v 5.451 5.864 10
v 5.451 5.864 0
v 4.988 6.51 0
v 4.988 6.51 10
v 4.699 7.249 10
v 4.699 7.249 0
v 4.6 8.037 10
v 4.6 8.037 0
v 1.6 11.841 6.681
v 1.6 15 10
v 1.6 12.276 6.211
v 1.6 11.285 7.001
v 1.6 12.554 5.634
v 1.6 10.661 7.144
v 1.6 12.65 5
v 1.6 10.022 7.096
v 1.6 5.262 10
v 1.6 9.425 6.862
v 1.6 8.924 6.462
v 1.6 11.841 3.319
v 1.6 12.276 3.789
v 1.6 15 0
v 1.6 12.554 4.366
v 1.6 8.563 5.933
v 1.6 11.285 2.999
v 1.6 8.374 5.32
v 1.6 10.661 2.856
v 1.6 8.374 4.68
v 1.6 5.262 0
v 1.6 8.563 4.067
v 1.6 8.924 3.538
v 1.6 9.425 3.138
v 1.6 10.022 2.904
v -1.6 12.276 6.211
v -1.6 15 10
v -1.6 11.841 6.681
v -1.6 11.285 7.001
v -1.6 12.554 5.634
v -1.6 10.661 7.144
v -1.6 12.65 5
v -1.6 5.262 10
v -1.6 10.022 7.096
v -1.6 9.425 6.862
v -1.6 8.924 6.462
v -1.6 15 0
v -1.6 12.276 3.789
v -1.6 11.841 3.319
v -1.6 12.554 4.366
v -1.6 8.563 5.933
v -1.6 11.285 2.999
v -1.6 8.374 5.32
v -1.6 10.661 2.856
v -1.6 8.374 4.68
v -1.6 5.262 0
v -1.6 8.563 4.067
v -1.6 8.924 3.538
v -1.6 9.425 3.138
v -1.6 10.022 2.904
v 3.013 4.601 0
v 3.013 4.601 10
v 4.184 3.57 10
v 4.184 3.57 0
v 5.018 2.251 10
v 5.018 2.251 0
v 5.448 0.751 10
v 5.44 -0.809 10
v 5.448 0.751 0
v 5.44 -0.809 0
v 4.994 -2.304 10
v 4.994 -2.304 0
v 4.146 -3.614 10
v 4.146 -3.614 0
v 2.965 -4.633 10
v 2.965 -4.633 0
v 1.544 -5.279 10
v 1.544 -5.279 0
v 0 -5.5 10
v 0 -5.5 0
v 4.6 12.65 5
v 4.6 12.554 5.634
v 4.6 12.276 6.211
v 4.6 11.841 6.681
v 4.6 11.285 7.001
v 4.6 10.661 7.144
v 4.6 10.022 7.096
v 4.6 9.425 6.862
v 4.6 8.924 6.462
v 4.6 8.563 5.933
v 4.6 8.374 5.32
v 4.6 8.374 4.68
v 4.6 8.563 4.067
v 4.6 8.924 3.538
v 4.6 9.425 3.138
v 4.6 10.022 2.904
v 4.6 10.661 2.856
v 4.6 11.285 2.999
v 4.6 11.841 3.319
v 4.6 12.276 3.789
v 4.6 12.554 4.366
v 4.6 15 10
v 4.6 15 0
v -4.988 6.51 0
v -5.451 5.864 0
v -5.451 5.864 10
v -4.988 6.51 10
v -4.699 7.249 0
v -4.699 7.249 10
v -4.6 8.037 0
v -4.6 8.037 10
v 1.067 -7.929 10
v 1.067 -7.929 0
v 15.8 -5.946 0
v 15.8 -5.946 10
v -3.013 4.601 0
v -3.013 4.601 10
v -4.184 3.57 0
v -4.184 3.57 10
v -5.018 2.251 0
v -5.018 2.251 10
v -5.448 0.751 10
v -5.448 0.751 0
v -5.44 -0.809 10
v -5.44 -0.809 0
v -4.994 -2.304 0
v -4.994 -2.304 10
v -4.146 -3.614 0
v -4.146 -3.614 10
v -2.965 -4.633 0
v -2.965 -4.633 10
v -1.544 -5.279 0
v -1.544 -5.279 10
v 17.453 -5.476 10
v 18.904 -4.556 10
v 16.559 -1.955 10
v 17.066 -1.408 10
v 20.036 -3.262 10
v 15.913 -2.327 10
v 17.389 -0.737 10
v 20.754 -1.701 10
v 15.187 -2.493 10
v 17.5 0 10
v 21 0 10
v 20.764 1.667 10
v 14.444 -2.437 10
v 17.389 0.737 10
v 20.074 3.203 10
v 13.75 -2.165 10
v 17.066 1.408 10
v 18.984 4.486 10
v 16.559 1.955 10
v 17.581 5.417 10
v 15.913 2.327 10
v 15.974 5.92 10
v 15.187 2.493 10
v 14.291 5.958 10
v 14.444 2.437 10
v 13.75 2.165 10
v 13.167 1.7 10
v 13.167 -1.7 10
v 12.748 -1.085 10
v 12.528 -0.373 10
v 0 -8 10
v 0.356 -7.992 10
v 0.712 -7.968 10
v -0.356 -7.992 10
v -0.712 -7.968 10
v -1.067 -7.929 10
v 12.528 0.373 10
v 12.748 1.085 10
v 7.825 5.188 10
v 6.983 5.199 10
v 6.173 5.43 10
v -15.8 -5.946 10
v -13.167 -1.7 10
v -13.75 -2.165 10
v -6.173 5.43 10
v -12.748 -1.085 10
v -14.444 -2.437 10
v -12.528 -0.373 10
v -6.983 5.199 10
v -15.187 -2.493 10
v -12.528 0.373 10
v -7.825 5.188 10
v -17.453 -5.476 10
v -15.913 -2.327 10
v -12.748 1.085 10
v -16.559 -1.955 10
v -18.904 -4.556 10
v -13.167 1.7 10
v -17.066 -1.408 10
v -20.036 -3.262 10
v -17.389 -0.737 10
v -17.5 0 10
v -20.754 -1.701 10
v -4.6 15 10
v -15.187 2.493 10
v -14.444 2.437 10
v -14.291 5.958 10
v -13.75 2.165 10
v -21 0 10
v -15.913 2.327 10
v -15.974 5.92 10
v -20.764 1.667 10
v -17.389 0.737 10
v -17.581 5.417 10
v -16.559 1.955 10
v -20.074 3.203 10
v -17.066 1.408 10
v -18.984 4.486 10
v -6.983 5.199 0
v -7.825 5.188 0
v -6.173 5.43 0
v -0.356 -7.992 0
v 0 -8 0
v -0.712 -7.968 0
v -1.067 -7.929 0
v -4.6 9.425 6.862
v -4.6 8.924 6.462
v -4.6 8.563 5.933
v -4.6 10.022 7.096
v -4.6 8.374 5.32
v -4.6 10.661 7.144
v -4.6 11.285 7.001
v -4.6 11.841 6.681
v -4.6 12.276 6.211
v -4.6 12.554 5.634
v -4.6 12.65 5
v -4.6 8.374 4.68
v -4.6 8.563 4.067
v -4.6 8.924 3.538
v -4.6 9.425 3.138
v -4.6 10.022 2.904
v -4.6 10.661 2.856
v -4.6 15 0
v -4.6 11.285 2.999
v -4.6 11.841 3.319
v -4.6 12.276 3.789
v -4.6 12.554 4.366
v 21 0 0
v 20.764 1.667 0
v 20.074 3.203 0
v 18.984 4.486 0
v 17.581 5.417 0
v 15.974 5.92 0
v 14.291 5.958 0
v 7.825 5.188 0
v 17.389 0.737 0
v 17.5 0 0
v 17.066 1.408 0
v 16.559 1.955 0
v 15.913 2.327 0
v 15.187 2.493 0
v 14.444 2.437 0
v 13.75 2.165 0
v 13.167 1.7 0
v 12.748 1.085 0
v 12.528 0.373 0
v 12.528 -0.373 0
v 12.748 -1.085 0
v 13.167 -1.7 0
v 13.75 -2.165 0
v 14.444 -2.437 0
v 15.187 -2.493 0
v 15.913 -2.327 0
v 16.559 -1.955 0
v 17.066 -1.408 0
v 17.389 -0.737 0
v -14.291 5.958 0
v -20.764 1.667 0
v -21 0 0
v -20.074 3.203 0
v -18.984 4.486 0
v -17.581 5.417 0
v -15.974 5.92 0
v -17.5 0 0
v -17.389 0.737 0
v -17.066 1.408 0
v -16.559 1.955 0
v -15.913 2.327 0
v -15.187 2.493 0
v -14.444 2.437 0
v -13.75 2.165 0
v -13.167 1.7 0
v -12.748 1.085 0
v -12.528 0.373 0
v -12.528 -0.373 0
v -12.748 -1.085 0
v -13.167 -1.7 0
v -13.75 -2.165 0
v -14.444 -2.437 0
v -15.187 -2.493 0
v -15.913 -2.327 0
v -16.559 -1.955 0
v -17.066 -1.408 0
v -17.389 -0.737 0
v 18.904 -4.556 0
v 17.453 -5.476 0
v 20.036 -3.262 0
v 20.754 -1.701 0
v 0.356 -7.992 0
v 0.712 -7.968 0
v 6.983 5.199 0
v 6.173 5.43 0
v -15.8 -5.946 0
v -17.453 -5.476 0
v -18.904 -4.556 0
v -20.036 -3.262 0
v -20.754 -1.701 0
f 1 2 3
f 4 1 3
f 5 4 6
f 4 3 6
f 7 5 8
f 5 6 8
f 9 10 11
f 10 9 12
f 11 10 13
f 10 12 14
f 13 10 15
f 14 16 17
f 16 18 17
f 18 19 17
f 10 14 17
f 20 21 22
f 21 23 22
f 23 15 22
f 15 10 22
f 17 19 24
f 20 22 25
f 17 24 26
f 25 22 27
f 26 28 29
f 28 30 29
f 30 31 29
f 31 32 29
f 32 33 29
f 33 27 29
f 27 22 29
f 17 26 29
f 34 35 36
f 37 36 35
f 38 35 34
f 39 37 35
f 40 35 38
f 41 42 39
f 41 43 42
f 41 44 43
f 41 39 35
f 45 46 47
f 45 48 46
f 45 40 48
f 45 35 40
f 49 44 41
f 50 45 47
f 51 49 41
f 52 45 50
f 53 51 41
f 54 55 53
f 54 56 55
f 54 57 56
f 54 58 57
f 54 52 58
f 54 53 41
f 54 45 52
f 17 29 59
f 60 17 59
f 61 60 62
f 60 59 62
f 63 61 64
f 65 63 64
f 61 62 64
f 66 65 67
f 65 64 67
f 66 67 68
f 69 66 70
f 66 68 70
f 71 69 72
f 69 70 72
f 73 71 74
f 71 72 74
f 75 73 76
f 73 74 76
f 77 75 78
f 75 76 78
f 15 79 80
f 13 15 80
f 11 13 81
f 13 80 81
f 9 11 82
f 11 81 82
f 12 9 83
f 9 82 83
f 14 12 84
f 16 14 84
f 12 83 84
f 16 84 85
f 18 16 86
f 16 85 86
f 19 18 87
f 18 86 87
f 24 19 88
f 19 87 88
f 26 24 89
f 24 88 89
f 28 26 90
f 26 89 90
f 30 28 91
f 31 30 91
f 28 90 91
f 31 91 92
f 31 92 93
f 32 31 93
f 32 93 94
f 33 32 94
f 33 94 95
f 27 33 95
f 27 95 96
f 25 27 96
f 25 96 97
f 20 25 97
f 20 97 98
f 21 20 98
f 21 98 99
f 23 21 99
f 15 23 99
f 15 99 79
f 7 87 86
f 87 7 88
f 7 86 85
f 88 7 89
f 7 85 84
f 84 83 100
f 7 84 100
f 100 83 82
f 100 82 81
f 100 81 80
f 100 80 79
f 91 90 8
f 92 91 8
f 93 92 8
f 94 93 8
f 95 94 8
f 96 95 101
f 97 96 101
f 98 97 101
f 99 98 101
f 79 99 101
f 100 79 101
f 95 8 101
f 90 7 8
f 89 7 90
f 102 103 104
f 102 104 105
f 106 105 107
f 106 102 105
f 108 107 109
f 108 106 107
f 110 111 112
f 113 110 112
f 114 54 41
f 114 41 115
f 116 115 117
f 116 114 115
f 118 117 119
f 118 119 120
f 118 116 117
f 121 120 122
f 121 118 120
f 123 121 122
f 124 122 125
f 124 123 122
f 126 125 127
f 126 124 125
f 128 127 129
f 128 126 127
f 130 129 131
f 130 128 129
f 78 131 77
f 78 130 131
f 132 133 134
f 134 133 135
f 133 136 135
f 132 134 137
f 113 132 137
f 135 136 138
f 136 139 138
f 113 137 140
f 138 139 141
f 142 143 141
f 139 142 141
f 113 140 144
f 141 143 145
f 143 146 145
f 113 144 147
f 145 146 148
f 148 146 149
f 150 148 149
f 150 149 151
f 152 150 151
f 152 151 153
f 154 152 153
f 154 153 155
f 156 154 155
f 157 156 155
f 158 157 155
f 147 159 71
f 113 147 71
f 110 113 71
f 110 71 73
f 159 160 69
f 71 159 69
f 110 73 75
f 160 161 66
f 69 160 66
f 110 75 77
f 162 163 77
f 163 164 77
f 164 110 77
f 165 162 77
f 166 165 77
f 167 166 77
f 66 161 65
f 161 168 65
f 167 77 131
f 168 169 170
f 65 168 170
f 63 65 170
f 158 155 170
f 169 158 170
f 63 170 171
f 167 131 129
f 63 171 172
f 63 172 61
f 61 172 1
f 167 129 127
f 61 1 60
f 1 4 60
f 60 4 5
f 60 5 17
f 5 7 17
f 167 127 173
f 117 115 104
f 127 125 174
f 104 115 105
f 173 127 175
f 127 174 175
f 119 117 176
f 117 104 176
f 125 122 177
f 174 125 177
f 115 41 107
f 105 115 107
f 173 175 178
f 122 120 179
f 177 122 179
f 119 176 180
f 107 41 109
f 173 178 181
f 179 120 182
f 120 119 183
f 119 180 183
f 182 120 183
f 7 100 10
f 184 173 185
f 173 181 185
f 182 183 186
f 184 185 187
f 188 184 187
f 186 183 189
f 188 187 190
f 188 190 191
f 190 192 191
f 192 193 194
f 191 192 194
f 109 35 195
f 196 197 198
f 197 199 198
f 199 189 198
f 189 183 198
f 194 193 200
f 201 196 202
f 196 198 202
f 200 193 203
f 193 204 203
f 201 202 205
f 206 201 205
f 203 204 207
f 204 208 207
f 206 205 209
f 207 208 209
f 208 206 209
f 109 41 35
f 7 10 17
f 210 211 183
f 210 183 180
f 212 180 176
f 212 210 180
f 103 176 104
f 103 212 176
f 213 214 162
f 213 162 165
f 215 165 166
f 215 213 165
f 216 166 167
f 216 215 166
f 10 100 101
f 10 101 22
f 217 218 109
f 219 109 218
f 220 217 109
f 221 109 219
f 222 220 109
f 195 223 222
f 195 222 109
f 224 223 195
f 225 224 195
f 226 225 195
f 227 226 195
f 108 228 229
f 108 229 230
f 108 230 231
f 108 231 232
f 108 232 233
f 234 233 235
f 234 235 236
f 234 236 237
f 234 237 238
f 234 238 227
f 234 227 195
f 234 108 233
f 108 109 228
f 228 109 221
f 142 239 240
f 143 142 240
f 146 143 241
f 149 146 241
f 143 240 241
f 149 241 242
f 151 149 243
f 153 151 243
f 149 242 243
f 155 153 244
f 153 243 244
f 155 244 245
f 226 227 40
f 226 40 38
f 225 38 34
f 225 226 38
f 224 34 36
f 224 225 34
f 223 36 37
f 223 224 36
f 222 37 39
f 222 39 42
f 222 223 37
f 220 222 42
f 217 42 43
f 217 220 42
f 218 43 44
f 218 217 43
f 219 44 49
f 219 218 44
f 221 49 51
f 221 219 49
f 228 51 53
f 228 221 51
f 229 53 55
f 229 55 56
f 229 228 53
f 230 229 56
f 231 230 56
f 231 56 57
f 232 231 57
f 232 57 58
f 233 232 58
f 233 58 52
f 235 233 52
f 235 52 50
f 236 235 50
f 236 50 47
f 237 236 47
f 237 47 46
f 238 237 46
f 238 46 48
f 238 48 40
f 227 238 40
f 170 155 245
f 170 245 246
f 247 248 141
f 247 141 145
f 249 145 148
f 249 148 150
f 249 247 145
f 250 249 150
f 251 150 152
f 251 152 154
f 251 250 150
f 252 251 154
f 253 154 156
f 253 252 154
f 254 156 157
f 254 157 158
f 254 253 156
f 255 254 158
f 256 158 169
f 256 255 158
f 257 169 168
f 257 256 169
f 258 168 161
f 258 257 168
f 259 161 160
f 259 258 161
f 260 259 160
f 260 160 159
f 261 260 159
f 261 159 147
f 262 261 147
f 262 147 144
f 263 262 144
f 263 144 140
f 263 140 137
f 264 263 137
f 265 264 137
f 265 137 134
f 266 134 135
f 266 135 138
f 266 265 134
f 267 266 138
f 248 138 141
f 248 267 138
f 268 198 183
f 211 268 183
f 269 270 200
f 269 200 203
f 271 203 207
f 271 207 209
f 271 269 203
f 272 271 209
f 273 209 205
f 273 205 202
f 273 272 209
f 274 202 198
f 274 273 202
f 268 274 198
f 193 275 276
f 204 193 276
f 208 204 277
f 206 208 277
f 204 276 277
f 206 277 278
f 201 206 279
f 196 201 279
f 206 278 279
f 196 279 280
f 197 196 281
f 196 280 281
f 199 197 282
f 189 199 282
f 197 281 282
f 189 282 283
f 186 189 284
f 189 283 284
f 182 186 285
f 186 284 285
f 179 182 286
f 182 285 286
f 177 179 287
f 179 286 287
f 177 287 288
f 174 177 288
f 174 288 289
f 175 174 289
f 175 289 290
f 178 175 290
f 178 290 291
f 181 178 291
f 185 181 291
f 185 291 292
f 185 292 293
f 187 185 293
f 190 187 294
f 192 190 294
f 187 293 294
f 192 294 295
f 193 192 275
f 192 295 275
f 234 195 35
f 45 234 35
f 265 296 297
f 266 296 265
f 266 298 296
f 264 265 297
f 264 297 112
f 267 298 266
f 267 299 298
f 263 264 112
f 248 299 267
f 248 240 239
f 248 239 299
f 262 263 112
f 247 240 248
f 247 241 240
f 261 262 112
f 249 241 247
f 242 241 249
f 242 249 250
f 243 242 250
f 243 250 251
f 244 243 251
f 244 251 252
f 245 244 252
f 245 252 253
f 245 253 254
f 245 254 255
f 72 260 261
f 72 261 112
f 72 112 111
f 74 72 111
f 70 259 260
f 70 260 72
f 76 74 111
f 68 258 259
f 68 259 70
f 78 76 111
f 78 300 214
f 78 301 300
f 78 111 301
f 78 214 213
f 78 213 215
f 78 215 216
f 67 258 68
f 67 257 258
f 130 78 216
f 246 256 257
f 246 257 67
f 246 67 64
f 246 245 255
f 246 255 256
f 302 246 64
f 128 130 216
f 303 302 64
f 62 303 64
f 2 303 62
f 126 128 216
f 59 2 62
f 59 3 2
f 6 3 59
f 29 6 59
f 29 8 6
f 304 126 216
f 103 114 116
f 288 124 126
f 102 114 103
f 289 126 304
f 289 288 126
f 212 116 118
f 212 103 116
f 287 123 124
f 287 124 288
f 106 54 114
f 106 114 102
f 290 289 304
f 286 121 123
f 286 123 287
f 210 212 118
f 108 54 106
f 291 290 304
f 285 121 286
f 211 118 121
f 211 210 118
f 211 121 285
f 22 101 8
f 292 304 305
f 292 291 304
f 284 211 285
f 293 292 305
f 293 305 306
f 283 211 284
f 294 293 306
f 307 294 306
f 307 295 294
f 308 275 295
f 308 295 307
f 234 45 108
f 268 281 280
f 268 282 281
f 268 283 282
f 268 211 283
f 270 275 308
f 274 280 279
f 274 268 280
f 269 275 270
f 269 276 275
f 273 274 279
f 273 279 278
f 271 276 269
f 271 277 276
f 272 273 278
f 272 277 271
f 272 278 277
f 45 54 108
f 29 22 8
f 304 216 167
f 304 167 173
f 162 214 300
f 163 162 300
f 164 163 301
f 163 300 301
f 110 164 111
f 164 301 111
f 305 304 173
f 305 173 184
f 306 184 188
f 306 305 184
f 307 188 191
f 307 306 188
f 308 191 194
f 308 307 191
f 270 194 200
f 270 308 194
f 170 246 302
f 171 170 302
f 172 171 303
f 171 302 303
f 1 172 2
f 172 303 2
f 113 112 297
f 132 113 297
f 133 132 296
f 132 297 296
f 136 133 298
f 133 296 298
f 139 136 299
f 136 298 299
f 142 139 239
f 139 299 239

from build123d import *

# Parameters (mm, degrees)
F0_R        = 2.5
F1_DEPTH    = 10
F2_R        = 2.15
F3_DEPTH    = 25
F5_T1_DEPTH = 10


# Not quite as in the source:
# - a fillet or chamfer that OpenCascade refuses, or shapes differently, is made with other operations: its cross-section is extruded or revolved along the edge and cut away or added


with BuildPart() as f1:
    # F0 (on Top) → F1 (new body)
    with BuildSketch(Plane.XY):
        with BuildLine():
            ThreePointArc((1.6, 5.2621288468), (5.4402071954, -0.8087927246), (0, -5.5))
            Line((0, -5.5), (0, -8))
            ThreePointArc((0, -8), (0.5345278854, -7.982122521), (1.0666667681, -7.9285699849))
            ThreePointArc((1.0666667681, -7.9285699849), (7.426445373, -2.9745435149), (6.2449979984, 5))
            ThreePointArc((6.2449979984, 5), (5.477264575, 5.8309152605), (4.6, 6.5452272688))
            ThreePointArc((4.6, 6.5452272688), (3.166710076, 7.3465602355), (1.6, 7.8383671769))
            Line((1.6, 7.8383671769), (1.6, 5.2621288468))
        make_face()
        with BuildLine():
            ThreePointArc((6.2449979984, 5), (7.426445373, -2.9745435149), (1.0666667681, -7.9285699849))
            Line((1.0666667681, -7.9285699849), (15.8, -5.9464274989))
            ThreePointArc((15.8, -5.9464274989), (9.0476534506, -0.7546989834), (14.2906457894, 5.9579204932))
            Line((14.2906457894, 5.9579204932), (6.2449979984, 5))
        make_face()
        with BuildLine():
            Line((1.6, 15), (1.6, 7.8383671769))
            ThreePointArc((1.6, 7.8383671769), (3.166710076, 7.3465602355), (4.6, 6.5452272688))
            Line((4.6, 6.5452272688), (4.6, 15))
            Line((4.6, 15), (1.6, 15))
        make_face()
        with BuildLine():
            ThreePointArc((14.2906457894, 5.9579204932), (9.0476534506, -0.7546989834), (15.8, -5.9464274989))
            ThreePointArc((15.8, -5.9464274989), (19.5166359163, -3.9496835316), (21, 0))
            ThreePointArc((21, 0), (18.9839600109, 4.4864309458), (14.2906457894, 5.9579204932))
        make_face()
        with Locations((15, 0)):
            Circle(F0_R, mode=Mode.SUBTRACT)
    extrude(amount=F1_DEPTH)

    # F2 (on face) → F3 (cut)
    with BuildSketch(Plane.YZ.offset(4.6)):
        with Locations((10.5, 5)):
            Circle(F2_R)
    extrude(amount=-F3_DEPTH, mode=Mode.SUBTRACT)

    # F4: F1 across plane


with BuildPart() as f1_1:
    add(f1.part)
    add(f1.part.mirror(Plane.YZ))

    # F5: fillet of radius 3.2 on 4 edges, made by hand

    # F5_s2 → F5_t1 (join)
    with BuildSketch(Plane.XY):
        with BuildLine():
            ThreePointArc((-5.5714285714, 5.7410089421), (-4.8528464095, 6.790702563), (-4.6, 8.037412519))
            Line((-4.6, 8.037412519), (-4.6, 6.5452272688))
            ThreePointArc((-4.6, 6.5452272688), (-5.1015861823, 6.1622900309), (-5.5714285714, 5.7410089421))
        make_face()
        with BuildLine():
            ThreePointArc((-7.8251476511, 5.1881337307), (-6.4876416555, 5.3128293037), (-5.3191610039, 5.9754938051))
            ThreePointArc((-5.3191610039, 5.9754938051), (-5.8026149621, 5.5072370206), (-6.2449979984, 5))
            Line((-6.2449979984, 5), (-7.8251476511, 5.1881337307))
        make_face()
        with BuildLine():
            ThreePointArc((7.8251476511, 5.1881337307), (6.4876416555, 5.3128293037), (5.3191610039, 5.9754938051))
            ThreePointArc((5.3191610039, 5.9754938051), (5.8026149621, 5.5072370206), (6.2449979984, 5))
            Line((6.2449979984, 5), (7.8251476511, 5.1881337307))
        make_face()
        with BuildLine():
            ThreePointArc((5.5714285714, 5.7410089421), (4.8528464095, 6.790702563), (4.6, 8.037412519))
            Line((4.6, 8.037412519), (4.6, 6.5452272688))
            ThreePointArc((4.6, 6.5452272688), (5.1015861823, 6.1622900309), (5.5714285714, 5.7410089421))
        make_face()
    extrude(amount=F5_T1_DEPTH)


solid = f1_1.part
